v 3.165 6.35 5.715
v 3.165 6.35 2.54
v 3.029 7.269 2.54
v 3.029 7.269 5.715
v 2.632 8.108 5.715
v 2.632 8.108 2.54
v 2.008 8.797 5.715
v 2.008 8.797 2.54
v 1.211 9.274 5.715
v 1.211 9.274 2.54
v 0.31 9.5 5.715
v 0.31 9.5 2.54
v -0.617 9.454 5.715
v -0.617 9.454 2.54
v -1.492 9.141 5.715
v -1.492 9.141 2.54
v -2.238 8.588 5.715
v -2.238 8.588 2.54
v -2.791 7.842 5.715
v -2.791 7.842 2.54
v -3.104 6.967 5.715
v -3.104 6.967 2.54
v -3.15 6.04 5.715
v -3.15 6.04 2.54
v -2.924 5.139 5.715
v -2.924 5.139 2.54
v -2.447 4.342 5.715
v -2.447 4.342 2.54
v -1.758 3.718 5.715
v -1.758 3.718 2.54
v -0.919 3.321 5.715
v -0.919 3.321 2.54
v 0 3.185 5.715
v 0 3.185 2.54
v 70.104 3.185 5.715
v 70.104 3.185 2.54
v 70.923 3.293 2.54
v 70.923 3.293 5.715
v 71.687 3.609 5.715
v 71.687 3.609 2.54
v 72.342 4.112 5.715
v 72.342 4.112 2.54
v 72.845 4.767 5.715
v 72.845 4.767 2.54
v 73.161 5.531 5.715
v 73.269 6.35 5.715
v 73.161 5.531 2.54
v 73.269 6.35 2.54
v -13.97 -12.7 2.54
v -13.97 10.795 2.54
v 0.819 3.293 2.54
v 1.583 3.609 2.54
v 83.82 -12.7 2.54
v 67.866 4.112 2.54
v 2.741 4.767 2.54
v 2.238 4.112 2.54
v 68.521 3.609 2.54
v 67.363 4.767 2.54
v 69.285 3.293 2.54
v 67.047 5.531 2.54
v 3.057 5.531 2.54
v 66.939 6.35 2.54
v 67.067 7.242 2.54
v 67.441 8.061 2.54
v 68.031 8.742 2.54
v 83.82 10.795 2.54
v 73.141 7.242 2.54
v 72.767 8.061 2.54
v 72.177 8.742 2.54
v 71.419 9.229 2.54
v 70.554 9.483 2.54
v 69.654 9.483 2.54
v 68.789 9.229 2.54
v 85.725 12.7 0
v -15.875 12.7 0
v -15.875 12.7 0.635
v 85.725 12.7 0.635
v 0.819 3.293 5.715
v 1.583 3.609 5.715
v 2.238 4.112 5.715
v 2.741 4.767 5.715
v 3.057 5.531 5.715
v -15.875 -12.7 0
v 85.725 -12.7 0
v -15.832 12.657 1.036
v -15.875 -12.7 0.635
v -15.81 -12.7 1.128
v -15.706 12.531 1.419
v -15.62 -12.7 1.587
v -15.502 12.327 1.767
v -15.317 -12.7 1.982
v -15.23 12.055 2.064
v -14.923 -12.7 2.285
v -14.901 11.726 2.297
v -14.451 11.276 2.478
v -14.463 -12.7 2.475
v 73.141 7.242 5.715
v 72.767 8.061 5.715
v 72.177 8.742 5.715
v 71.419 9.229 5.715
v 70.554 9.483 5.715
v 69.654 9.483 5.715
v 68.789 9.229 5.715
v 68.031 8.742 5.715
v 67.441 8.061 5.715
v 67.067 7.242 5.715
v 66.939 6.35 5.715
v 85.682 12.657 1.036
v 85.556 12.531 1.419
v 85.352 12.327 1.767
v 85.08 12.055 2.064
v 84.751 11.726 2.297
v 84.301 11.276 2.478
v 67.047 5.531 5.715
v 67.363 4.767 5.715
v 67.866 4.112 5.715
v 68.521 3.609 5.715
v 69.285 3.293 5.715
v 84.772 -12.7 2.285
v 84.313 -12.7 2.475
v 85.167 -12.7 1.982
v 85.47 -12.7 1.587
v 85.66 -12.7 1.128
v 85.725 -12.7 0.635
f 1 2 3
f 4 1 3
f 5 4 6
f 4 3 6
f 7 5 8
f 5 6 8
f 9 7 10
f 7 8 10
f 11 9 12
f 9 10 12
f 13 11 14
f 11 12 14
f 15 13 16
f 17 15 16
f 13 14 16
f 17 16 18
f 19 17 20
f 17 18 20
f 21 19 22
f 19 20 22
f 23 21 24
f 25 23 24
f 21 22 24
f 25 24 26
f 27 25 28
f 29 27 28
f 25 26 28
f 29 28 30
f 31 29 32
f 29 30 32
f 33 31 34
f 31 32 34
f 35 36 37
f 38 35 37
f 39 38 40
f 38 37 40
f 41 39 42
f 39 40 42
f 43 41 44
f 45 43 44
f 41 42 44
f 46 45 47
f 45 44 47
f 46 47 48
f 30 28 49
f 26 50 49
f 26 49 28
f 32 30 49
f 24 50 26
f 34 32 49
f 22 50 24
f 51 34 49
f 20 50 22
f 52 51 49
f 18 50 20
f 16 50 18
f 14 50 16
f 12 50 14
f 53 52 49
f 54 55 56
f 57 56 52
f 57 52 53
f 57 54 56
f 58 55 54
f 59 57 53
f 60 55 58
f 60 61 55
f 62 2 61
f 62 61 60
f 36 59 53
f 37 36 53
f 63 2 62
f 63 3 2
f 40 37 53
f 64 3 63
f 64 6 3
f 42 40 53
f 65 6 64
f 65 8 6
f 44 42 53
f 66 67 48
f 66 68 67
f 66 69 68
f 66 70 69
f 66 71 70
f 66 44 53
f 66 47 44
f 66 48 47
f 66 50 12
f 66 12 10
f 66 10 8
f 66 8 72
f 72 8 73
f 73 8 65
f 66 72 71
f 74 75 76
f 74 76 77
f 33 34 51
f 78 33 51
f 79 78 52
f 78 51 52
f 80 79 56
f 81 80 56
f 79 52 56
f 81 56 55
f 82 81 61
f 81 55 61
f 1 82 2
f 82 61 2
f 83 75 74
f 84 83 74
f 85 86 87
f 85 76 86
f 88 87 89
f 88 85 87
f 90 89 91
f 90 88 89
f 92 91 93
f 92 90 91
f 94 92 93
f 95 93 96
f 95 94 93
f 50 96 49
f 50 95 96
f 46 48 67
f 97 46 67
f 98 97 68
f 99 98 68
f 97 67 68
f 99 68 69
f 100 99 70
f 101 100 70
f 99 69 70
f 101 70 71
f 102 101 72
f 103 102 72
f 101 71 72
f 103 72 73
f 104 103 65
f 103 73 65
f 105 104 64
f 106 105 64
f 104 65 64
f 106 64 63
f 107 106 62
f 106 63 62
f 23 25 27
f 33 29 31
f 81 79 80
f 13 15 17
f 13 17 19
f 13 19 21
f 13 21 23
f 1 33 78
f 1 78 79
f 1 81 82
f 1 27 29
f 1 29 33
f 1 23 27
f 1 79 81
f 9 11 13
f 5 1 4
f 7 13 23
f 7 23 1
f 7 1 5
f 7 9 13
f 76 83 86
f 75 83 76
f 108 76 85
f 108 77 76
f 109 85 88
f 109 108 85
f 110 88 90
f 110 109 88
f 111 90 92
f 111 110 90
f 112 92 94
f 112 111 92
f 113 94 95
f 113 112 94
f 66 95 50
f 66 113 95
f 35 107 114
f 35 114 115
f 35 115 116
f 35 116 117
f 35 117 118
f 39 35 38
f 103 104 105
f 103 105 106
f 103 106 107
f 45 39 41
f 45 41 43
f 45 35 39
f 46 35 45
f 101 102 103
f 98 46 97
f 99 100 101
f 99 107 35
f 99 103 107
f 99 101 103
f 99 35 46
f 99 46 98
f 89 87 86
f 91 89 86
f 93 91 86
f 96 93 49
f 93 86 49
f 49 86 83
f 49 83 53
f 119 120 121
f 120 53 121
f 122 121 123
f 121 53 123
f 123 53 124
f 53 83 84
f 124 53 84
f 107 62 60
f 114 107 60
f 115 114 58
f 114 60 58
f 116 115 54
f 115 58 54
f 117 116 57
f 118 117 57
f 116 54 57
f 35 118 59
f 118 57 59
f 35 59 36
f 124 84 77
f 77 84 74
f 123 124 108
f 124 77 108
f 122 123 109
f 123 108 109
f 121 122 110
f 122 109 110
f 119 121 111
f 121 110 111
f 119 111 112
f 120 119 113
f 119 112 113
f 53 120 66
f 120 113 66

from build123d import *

# Parameters (mm, degrees)
F0_W     = 101.6
F0_H     = 25.4
F1_DEPTH = 2.54
F2_R     = 1.905
F4_DEPTH = 3.175


with BuildPart() as f1:
    # F0 (on Top) → F1 (new body)
    with BuildSketch(Plane.XY):
        with Locations((34.925, 0)):
            Rectangle(F0_W, F0_H)
        with BuildLine():
            Line((69.85, 0), (0, 0))
            Line((0, 0), (0, 3.175))
            ThreePointArc((0, 3.175), (-2.2450640303, 8.5950640303), (3.175, 6.35))
            Line((3.175, 6.35), (66.675, 6.35))
            ThreePointArc((66.675, 6.35), (69.85, 9.525), (73.025, 6.35))
            ThreePointArc((73.025, 6.35), (72.0950640303, 4.1049359697), (69.85, 3.175))
            Line((69.85, 3.175), (69.85, 0))
        make_face(mode=Mode.SUBTRACT)
        with BuildLine():
            Line((0, 3.175), (0, 0))
            Line((0, 0), (69.85, 0))
            Line((69.85, 0), (69.85, 3.175))
            ThreePointArc((69.85, 3.175), (67.6049359697, 4.1049359697), (66.675, 6.35))
            Line((66.675, 6.35), (3.175, 6.35))
            ThreePointArc((3.175, 6.35), (2.2450640303, 4.1049359697), (0, 3.175))
        make_face()
        with BuildLine():
            Line((69.85, 6.35), (69.85, 3.175))
            ThreePointArc((69.85, 3.175), (72.0950640303, 4.1049359697), (73.025, 6.35))
            ThreePointArc((73.025, 6.35), (69.85, 9.525), (66.675, 6.35))
            Line((66.675, 6.35), (69.85, 6.35))
        make_face()
        with BuildLine():
            ThreePointArc((3.175, 6.35), (-2.2450640303, 8.5950640303), (0, 3.175))
            Line((0, 3.175), (0, 6.35))
            Line((0, 6.35), (3.175, 6.35))
        make_face()
        with BuildLine():
            Line((0, 6.35), (0, 3.175))
            ThreePointArc((0, 3.175), (2.2450640303, 4.1049359697), (3.175, 6.35))
            Line((3.175, 6.35), (0, 6.35))
        make_face()
        with BuildLine():
            ThreePointArc((66.675, 6.35), (67.6049359697, 4.1049359697), (69.85, 3.175))
            Line((69.85, 3.175), (69.85, 6.35))
            Line((69.85, 6.35), (66.675, 6.35))
        make_face()
    extrude(amount=F1_DEPTH)

    # F2
    f2_edges = [f1.edges().sort_by_distance(p)[0] for p in [
        (34.925, 12.7, 2.54),
        (-15.875, 0, 2.54),
        (85.725, 0, 2.54),
    ]]
    fillet(f2_edges, radius=F2_R)

    # F3 (on face) → F4 (join)
    with BuildSketch(Plane.XY.offset(2.54)):
        with BuildLine():
            ThreePointArc((66.939, 6.35), (67.8660070375, 4.1120070375), (70.104, 3.185))
            Line((70.104, 3.185), (70.104, 6.35))
            Line((70.104, 6.35), (66.939, 6.35))
        make_face()
        with BuildLine():
            Line((70.104, 6.35), (70.104, 3.185))
            ThreePointArc((70.104, 3.185), (72.3419929625, 4.1120070375), (73.269, 6.35))
            ThreePointArc((73.269, 6.35), (70.104, 9.515), (66.939, 6.35))
            Line((66.939, 6.35), (70.104, 6.35))
        make_face()
        with BuildLine():
            Line((0, 6.35), (0, 3.185))
            ThreePointArc((0, 3.185), (2.2379929625, 4.1120070375), (3.165, 6.35))
            Line((3.165, 6.35), (0, 6.35))
        make_face()
        with BuildLine():
            ThreePointArc((3.165, 6.35), (-2.2379929625, 8.5879929625), (0, 3.185))
            Line((0, 3.185), (0, 6.35))
            Line((0, 6.35), (3.165, 6.35))
        make_face()
    extrude(amount=F4_DEPTH)


solid = f1.part
